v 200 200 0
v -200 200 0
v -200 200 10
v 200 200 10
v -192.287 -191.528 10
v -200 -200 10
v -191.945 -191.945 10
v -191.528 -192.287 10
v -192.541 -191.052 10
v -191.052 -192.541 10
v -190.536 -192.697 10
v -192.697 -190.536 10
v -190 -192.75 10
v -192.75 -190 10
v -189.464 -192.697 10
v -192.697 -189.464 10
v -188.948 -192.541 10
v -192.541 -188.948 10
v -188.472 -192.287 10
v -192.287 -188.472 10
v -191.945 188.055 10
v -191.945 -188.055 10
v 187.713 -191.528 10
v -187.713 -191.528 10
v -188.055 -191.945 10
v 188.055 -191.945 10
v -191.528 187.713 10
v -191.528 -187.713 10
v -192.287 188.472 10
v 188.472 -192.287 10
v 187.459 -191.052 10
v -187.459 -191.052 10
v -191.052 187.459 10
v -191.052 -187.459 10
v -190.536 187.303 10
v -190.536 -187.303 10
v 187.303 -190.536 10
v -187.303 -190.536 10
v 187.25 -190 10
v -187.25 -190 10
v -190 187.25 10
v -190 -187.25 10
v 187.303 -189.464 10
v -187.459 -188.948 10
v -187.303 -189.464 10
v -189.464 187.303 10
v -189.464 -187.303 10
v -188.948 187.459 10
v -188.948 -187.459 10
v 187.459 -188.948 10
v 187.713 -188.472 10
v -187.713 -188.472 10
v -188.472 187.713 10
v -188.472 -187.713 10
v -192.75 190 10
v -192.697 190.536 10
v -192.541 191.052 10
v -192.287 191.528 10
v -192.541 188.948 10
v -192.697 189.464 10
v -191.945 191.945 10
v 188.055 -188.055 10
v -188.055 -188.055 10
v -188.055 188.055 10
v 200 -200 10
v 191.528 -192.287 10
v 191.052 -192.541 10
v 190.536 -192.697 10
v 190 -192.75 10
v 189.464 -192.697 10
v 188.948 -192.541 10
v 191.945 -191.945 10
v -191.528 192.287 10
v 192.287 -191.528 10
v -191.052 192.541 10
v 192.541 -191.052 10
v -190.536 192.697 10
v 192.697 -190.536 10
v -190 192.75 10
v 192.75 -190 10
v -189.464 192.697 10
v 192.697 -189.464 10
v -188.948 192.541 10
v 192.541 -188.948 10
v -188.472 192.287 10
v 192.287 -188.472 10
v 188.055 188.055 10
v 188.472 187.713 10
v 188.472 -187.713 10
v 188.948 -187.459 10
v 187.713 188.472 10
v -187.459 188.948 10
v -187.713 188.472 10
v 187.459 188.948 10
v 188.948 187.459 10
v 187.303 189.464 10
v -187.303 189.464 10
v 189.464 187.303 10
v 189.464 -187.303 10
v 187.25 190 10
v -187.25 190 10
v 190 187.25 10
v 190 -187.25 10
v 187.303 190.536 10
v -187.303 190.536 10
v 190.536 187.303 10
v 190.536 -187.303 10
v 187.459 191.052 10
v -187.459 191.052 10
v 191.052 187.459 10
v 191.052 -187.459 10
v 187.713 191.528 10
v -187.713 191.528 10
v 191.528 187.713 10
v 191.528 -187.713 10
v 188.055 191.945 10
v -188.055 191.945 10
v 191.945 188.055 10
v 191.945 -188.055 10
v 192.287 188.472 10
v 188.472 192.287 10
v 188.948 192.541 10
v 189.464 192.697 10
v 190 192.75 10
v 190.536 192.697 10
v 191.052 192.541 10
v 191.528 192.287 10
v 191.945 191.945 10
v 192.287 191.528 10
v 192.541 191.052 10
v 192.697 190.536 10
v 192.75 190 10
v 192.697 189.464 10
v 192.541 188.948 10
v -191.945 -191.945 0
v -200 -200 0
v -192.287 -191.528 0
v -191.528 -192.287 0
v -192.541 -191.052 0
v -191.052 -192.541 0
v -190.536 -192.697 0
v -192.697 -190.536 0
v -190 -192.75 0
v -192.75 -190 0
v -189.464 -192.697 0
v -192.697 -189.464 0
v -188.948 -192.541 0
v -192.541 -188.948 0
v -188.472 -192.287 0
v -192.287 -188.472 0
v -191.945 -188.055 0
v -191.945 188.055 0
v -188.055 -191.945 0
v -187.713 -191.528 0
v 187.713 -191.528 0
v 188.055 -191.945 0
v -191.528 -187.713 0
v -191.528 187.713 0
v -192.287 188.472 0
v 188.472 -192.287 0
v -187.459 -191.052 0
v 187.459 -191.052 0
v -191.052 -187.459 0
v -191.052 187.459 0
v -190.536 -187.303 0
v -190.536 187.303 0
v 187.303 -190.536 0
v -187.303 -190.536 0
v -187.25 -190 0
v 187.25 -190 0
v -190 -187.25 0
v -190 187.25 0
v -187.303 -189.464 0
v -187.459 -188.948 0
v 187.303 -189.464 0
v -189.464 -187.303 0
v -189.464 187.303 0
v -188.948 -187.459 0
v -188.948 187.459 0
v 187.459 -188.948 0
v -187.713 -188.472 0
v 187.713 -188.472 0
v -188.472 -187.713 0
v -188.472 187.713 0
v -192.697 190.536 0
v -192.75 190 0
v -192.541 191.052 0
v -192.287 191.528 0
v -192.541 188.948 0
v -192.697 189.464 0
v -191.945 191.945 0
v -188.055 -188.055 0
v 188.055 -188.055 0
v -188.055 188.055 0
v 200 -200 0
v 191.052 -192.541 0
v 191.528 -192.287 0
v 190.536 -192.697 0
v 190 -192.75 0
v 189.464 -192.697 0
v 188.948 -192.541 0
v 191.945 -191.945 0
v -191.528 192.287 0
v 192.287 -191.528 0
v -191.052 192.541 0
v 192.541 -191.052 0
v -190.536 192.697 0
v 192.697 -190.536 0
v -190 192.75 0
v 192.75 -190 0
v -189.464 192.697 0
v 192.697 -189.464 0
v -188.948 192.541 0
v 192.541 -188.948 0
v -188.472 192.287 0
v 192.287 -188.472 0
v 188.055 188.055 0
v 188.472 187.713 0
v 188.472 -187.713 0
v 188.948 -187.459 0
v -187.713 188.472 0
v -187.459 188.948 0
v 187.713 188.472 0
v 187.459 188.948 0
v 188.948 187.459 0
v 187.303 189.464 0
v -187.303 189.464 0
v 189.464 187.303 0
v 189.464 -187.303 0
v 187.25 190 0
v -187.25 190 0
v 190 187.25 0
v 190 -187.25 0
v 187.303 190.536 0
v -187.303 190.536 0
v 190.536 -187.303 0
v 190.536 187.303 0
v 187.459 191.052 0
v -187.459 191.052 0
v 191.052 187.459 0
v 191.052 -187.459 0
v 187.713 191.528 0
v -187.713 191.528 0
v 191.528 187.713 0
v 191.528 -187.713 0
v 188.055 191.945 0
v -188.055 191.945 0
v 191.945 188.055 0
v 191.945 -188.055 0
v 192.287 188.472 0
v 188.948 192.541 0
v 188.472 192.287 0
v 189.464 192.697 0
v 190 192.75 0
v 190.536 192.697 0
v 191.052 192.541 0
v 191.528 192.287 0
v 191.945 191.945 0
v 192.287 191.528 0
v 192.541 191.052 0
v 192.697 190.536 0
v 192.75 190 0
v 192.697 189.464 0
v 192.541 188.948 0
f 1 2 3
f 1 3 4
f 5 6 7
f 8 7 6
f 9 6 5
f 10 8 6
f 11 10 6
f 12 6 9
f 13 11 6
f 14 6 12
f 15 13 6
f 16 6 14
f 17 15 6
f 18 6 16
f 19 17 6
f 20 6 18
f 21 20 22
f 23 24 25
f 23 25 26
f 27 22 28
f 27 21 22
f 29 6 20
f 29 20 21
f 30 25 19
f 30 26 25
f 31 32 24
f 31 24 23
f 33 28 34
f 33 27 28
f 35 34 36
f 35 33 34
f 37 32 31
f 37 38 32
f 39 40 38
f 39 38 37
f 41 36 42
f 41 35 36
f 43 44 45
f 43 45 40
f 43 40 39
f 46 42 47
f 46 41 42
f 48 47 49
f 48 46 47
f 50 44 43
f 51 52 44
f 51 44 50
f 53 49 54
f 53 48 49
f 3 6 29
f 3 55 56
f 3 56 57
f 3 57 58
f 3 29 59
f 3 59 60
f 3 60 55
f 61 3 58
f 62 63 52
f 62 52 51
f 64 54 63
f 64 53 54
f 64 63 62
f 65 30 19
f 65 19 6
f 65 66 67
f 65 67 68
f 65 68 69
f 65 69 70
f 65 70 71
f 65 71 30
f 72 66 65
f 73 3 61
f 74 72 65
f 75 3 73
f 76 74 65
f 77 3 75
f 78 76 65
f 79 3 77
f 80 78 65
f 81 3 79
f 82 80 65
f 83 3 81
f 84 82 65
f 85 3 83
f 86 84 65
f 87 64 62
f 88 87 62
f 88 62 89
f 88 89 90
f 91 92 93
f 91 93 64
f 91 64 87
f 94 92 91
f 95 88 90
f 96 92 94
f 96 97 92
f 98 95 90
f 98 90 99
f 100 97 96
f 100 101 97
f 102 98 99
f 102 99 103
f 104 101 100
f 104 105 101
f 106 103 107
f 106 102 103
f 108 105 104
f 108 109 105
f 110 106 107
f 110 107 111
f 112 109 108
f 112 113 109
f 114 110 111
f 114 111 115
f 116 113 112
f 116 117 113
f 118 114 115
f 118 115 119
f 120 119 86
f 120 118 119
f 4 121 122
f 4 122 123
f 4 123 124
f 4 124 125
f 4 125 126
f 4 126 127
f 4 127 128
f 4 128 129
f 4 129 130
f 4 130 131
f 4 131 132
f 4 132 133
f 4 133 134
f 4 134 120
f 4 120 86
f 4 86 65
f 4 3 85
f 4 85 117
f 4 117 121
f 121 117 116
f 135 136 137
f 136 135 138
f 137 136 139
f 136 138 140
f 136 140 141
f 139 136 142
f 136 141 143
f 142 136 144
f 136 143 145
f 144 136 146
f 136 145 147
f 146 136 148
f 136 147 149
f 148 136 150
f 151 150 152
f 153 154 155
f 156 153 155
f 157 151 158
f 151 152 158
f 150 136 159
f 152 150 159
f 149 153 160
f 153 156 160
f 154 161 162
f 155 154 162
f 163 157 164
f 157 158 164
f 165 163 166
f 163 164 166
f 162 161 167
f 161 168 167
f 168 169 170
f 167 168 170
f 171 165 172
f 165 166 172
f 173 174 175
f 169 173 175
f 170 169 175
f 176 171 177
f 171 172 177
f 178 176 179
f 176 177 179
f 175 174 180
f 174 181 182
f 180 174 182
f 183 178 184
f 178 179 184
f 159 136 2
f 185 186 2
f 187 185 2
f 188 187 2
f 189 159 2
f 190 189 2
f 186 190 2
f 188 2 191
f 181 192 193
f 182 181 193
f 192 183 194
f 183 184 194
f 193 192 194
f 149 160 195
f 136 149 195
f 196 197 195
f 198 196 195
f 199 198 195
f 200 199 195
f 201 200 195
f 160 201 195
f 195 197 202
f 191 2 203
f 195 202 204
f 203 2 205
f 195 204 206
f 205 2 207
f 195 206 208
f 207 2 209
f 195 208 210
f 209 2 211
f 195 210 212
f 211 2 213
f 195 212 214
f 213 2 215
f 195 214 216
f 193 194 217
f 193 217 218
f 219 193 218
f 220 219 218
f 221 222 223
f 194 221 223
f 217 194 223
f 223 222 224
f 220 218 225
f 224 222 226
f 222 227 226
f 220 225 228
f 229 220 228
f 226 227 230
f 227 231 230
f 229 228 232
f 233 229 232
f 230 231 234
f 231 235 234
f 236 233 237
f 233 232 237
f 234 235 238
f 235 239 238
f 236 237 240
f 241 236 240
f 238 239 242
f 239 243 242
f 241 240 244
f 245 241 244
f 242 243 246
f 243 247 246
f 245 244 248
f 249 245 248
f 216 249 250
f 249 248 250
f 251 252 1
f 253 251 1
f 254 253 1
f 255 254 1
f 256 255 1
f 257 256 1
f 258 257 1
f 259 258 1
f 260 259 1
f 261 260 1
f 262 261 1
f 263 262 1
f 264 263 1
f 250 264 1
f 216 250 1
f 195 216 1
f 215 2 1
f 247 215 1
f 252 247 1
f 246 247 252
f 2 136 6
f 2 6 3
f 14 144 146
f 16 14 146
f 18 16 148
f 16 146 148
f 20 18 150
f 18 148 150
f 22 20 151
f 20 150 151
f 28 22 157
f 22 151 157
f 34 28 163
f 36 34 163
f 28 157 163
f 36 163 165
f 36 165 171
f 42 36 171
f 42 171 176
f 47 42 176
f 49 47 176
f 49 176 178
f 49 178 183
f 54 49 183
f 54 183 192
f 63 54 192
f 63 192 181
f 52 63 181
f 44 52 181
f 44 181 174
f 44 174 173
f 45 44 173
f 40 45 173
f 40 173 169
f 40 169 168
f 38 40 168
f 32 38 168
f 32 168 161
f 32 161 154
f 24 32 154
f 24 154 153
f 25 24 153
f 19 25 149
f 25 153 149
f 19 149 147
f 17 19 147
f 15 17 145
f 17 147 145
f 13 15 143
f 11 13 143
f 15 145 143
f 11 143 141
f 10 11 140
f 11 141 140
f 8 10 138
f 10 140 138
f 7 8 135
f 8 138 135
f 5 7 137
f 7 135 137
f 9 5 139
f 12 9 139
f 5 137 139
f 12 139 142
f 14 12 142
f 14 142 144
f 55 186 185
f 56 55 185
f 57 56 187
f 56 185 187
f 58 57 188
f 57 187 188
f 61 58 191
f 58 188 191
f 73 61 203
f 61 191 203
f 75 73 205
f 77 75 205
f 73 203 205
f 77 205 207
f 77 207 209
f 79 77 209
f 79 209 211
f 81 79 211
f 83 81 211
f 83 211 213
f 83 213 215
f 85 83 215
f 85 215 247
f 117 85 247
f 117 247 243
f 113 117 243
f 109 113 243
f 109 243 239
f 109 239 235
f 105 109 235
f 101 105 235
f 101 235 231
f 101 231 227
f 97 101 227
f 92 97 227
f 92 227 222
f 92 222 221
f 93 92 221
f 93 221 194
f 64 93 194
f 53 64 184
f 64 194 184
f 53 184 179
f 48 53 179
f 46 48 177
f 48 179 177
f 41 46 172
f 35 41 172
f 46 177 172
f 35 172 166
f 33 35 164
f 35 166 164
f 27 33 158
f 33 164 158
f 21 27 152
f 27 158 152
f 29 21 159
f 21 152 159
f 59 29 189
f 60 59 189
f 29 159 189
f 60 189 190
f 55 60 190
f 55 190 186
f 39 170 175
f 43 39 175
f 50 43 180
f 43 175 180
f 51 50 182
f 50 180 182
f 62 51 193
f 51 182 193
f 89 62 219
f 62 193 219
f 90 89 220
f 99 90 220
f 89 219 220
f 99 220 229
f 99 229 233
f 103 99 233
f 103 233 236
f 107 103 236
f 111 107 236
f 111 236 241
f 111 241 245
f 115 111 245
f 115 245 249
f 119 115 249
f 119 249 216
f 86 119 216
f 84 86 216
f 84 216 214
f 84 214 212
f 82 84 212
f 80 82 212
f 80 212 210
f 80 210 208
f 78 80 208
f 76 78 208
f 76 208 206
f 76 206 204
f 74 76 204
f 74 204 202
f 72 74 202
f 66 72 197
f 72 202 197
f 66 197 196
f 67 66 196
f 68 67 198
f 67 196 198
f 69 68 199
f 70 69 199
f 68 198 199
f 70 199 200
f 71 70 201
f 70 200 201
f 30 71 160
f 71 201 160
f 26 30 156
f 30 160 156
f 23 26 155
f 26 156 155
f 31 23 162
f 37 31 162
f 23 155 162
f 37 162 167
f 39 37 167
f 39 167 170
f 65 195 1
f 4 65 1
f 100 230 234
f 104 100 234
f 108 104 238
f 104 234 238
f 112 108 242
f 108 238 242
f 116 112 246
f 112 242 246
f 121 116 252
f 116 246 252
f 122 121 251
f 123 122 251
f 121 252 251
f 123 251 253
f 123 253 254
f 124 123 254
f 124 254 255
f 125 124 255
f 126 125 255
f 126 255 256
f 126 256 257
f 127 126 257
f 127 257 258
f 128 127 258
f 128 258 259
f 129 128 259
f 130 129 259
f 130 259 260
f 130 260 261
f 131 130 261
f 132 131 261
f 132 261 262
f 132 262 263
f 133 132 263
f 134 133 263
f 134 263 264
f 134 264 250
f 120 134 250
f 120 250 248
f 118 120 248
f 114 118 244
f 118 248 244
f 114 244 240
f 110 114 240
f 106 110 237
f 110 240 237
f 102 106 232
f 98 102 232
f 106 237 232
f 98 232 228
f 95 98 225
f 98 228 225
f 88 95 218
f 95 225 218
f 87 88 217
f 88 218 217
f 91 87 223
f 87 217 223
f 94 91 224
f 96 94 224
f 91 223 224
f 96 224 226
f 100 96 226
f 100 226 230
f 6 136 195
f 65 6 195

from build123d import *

# Parameters (mm, degrees)
ESQUISSE1_W          = 400
ESQUISSE1_H          = 400
BOSS_EXTRU_1_DEPTH   = 10
D_GAGEMENT_M51_D     = 5.5
D_GAGEMENT_M51_DEPTH = 16


with BuildPart() as part:
    # Esquisse1 → Boss.-Extru.1 (new body)
    with BuildSketch(Plane.XY):
        Rectangle(ESQUISSE1_W, ESQUISSE1_H)
    extrude(amount=BOSS_EXTRU_1_DEPTH)

    # Dégagement M51
    with Locations(Plane.XY.offset(10)):
        with Locations((190, 190), (-190, 190), (-190, -190), (190, -190)):
            Hole(D_GAGEMENT_M51_D / 2, depth=D_GAGEMENT_M51_DEPTH)


solid = part.part
